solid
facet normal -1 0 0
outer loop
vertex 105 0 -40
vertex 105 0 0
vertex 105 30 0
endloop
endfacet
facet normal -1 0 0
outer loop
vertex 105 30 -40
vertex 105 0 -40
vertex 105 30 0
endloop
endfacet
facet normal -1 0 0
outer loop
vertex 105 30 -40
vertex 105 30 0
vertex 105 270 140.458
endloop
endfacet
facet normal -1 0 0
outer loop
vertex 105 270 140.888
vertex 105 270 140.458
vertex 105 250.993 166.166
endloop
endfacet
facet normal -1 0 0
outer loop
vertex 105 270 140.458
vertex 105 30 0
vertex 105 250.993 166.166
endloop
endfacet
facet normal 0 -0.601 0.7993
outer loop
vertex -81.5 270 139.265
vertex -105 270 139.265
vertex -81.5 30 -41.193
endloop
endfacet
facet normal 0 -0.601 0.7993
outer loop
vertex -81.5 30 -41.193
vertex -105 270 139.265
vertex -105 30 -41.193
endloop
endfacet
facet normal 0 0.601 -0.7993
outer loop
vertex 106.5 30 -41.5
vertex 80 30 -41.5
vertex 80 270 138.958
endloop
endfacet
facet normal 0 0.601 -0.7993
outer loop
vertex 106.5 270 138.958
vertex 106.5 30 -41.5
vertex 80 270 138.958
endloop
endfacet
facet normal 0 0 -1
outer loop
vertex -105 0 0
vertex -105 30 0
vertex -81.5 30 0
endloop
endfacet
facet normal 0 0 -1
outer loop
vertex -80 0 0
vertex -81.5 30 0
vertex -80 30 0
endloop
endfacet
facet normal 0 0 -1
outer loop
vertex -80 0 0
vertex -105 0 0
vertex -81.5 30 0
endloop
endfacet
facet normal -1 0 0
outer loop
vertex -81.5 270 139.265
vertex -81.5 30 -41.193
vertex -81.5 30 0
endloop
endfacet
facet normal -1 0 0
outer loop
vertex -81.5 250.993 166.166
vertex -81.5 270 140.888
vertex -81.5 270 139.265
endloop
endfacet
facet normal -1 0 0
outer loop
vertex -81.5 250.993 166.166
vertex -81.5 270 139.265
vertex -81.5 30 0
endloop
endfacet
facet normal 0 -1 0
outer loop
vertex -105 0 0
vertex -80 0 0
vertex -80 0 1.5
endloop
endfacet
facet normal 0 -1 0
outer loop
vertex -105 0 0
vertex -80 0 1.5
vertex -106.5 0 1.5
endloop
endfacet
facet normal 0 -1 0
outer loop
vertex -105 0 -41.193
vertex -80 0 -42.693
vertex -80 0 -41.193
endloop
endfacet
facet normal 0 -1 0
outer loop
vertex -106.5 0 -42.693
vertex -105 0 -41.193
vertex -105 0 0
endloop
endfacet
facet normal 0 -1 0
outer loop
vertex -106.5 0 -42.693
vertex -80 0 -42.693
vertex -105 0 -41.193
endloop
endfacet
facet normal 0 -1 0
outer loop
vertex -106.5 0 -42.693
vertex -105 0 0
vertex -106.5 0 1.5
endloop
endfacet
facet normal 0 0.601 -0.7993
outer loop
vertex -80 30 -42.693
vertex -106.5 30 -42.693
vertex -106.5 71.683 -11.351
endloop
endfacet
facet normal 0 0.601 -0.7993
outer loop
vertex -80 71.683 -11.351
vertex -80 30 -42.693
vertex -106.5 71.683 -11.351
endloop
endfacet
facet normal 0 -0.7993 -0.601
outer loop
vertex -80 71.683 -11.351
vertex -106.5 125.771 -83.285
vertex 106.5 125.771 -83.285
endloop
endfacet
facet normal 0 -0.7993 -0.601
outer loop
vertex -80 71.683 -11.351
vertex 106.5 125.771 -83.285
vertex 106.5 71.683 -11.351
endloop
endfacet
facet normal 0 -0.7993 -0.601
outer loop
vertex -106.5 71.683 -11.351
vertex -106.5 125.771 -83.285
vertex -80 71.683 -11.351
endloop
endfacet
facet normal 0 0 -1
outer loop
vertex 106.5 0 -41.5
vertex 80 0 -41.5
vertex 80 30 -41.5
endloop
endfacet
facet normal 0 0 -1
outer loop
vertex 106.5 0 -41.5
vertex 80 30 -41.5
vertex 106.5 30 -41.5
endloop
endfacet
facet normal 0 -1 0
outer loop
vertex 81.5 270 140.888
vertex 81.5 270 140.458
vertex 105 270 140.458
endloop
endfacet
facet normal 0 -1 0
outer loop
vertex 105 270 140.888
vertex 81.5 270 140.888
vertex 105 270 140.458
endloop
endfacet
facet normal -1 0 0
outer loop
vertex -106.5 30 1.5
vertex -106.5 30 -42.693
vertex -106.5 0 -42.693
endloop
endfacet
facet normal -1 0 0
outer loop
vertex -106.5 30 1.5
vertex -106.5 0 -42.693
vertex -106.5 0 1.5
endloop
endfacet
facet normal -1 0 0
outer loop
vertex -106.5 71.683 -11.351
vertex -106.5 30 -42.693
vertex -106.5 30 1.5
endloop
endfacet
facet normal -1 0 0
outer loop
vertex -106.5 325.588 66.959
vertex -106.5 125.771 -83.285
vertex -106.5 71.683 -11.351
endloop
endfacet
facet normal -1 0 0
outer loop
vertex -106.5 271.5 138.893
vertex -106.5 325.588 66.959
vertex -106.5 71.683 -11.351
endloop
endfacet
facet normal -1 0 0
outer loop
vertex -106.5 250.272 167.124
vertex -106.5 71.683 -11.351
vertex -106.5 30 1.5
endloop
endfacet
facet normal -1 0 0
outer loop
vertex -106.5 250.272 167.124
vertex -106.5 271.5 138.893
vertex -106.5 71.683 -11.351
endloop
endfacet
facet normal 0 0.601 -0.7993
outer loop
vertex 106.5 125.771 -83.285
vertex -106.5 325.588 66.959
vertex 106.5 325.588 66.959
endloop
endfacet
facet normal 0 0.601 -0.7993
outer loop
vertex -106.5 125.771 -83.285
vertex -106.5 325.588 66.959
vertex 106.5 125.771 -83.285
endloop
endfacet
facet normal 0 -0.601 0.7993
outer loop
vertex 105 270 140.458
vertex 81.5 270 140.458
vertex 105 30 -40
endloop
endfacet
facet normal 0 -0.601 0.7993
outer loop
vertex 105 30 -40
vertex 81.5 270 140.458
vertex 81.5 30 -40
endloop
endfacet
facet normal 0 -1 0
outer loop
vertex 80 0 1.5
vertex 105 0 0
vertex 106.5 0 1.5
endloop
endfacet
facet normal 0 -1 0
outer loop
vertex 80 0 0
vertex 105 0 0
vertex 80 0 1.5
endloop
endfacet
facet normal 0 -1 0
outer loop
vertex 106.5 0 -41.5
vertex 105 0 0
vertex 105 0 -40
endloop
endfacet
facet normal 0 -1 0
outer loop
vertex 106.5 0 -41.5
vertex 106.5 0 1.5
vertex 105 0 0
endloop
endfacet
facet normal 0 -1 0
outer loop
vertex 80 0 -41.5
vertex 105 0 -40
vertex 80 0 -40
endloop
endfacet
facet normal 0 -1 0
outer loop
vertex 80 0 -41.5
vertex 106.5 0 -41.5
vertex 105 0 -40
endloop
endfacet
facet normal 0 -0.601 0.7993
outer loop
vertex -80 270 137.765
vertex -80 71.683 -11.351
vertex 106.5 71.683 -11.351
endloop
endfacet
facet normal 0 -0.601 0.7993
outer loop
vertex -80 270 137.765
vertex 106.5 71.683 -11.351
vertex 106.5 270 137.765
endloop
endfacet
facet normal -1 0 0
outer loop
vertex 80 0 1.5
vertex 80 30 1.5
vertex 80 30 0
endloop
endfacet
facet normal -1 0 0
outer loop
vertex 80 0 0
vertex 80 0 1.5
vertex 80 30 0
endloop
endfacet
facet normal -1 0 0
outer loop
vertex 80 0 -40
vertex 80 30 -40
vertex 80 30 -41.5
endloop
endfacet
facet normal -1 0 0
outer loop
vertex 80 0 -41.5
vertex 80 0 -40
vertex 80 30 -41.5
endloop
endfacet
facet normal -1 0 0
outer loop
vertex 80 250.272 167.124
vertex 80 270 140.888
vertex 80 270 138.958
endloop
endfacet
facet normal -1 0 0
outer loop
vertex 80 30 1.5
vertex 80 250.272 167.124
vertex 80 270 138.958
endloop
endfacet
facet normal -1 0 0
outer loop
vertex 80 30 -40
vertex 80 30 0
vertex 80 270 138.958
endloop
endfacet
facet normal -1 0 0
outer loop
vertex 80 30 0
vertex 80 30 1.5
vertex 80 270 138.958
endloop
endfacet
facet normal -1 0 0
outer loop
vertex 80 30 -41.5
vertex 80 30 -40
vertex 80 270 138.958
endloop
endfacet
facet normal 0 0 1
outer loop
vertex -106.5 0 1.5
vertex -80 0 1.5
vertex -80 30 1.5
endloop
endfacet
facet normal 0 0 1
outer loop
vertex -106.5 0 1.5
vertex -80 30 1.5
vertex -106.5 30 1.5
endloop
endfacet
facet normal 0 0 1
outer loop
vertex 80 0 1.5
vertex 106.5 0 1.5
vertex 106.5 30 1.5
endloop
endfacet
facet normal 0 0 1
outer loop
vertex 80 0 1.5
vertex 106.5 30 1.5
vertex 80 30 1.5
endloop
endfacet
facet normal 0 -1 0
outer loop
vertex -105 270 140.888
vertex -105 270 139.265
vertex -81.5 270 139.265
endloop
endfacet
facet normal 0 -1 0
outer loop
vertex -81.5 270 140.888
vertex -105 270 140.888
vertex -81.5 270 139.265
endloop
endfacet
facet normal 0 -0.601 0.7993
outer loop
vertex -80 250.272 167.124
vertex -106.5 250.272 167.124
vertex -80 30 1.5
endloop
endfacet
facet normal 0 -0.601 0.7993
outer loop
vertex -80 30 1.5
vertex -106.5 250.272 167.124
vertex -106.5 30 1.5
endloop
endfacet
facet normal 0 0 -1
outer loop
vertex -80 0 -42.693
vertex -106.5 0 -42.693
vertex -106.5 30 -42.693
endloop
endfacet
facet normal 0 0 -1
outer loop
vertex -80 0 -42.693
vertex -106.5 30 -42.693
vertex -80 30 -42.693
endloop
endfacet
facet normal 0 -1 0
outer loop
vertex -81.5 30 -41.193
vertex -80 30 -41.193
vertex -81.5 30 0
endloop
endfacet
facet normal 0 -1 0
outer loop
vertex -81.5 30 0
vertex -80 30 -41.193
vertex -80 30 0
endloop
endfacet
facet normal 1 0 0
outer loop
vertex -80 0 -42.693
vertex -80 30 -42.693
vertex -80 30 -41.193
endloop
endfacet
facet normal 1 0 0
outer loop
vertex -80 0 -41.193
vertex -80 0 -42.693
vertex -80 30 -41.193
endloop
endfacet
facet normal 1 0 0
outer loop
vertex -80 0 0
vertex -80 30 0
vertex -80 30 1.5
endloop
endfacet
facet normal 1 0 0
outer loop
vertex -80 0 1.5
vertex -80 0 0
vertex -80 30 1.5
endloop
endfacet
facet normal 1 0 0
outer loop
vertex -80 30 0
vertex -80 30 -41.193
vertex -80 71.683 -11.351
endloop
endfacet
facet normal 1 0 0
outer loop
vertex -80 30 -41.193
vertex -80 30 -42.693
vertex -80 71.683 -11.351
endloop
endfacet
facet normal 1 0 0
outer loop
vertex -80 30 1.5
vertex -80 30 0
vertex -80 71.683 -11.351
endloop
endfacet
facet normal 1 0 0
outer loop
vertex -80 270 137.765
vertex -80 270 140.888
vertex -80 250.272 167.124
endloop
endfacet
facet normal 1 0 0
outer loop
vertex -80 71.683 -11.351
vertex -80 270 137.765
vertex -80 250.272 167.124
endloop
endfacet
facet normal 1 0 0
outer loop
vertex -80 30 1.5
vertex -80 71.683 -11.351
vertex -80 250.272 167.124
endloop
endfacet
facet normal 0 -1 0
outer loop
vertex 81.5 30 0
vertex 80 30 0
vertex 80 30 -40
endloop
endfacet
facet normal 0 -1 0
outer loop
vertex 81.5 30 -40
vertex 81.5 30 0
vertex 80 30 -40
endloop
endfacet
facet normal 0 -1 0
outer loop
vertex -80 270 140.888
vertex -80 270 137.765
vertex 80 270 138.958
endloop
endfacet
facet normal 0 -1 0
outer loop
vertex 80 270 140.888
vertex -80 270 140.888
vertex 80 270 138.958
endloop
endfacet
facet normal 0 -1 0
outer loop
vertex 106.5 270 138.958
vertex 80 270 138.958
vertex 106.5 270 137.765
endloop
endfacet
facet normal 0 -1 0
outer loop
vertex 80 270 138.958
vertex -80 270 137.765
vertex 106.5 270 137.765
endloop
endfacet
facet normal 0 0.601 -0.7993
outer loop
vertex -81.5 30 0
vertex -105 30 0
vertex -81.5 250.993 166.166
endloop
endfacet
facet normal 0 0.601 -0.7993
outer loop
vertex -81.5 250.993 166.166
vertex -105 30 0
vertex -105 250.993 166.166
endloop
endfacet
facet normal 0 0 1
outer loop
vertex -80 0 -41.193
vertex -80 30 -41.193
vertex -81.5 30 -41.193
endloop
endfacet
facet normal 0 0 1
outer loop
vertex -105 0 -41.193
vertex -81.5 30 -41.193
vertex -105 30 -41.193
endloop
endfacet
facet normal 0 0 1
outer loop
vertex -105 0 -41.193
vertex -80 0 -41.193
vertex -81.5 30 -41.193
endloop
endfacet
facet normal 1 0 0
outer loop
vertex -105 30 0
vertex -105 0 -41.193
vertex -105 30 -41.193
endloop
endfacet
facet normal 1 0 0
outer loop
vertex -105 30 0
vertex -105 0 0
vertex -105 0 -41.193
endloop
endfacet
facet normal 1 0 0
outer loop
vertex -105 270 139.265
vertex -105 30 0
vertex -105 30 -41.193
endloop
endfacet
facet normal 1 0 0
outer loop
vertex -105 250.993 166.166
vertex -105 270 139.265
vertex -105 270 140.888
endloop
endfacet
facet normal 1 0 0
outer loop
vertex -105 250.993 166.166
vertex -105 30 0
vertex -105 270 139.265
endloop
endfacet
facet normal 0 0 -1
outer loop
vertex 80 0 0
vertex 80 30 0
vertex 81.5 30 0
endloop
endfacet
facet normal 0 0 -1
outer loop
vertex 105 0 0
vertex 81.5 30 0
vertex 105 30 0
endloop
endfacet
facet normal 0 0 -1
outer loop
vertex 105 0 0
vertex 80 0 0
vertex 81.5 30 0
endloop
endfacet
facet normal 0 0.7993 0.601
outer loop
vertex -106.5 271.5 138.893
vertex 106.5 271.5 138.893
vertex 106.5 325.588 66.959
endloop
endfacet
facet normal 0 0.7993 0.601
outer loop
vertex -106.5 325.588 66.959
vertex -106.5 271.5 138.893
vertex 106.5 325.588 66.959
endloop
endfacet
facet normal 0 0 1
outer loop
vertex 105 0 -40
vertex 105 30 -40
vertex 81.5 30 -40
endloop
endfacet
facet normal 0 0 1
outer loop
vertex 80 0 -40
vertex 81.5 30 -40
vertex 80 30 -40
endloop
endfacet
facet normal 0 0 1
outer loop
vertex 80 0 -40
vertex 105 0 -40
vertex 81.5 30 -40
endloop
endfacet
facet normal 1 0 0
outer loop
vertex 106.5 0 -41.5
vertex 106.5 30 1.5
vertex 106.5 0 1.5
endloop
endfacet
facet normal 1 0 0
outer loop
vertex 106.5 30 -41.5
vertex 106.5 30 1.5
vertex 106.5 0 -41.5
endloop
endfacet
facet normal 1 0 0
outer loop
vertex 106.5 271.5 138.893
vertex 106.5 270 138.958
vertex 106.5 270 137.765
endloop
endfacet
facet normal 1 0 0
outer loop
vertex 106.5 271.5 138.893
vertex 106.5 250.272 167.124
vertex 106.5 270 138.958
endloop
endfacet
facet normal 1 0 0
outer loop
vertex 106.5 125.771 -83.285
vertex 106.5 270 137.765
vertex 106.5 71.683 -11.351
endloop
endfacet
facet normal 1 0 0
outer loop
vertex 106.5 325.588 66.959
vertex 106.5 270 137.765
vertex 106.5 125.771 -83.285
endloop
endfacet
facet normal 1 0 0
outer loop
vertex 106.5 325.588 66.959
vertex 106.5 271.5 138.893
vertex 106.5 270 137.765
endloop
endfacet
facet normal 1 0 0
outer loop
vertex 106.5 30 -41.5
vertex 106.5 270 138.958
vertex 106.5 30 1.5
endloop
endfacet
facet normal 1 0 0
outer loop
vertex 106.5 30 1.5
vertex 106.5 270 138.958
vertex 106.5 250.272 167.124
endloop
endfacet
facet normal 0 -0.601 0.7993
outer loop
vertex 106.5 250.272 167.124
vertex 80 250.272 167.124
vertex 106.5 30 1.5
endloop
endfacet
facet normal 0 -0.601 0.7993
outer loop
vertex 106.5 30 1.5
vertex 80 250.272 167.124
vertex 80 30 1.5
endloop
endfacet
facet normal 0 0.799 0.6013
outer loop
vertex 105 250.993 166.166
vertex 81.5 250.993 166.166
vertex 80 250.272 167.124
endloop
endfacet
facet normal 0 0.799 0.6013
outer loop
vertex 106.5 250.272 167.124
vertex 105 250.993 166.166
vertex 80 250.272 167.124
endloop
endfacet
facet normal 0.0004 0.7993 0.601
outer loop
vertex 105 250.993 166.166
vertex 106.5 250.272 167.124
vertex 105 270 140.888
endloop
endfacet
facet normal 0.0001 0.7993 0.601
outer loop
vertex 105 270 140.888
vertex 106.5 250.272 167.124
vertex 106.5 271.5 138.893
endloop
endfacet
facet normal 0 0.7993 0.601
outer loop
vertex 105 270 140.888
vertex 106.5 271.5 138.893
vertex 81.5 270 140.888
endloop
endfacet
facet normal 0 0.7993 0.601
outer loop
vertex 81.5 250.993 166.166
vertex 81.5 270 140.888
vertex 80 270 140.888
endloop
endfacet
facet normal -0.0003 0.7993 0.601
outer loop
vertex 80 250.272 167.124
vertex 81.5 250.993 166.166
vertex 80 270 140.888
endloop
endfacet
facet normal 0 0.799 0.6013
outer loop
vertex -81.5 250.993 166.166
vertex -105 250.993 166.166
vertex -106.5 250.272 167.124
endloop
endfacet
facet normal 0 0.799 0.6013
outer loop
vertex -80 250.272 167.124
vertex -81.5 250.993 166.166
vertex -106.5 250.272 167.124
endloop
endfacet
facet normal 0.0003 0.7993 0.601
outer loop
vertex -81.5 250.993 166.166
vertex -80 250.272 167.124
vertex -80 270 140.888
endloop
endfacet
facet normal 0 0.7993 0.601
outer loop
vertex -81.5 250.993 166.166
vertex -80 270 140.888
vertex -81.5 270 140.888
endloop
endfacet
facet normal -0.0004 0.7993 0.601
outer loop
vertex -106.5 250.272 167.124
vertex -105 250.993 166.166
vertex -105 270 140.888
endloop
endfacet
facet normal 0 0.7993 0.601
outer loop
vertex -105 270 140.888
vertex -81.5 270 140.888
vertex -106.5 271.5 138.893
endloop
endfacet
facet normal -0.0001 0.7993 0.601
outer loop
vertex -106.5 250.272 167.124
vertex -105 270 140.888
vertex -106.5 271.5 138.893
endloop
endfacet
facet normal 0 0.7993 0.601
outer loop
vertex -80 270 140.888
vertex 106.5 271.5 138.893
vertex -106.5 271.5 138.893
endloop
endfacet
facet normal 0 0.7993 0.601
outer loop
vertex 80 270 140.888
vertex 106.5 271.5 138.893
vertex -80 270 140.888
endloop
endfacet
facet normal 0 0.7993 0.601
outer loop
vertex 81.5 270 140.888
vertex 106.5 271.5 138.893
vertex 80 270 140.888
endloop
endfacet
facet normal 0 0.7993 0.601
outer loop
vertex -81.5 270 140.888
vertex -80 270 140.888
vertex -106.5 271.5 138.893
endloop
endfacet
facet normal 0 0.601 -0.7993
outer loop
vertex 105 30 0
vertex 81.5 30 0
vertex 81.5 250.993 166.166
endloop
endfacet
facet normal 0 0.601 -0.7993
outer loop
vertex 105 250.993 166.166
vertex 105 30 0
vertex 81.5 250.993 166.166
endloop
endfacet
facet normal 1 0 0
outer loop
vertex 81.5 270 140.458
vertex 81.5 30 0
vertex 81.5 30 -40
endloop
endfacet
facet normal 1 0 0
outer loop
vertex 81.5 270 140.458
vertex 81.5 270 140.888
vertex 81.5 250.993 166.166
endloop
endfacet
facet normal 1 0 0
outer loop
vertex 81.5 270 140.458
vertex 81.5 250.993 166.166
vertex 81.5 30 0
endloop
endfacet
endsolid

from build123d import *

# Parameters (mm, degrees)
BOSS_EXTRUDE1_DEPTH   = 30
BOSS_EXTRUDE1_2_DEPTH = 30
SWEEP1_START          = -106.5
SWEEP1_DEPTH          = 26.5
SWEEP1_2_DEPTH        = 1.5
SWEEP2_START          = 80
SWEEP2_DEPTH          = 26.5
SWEEP2_START_2        = 105
SWEEP2_2_DEPTH        = 1.5
BOSS_EXTRUDE2_DEPTH   = 1.5
BOSS_EXTRUDE3_DEPTH   = 1.5
SKETCH7_W             = 213
SKETCH7_H             = 44.192821834
BOSS_EXTRUDE4_DEPTH   = 1.5
BOSS_EXTRUDE5_REACH   = 392.115
SKETCH9_W             = 222.593563538
SKETCH9_H             = 76.90916357
CUT_EXTRUDE1_DEPTH    = 487.5


# Read off the part's stored shape, not the designer's step: Sweep1, Sweep2
with BuildPart() as part:
    # Sketch1 → Boss-Extrude1 (new body)
    with BuildSketch(Plane(origin=(0, 0, 0), x_dir=(1, 0, 0), z_dir=(0, 1, 0))):
        Polygon((-80, 0), (-80, -1.5), (-106.5, -1.5), (-106.5, 42.692821834), (-80, 42.692821834), (-80, 41.192821834), (-105, 41.192821834), (-105, 0), align=None)
    extrude(amount=BOSS_EXTRUDE1_DEPTH)

    # Sweep1 outline → Sweep1 (add)
    with BuildSketch(Plane.YZ.offset(SWEEP1_START)):
        Polygon((30, -42.692821834), (270, 137.764932896), (270, 139.264932896), (30, -41.192821834), align=None)
        Polygon((30, 0), (270, 180.45775473), (270, 181.95775473), (30, 1.5), align=None)
    extrude(amount=SWEEP1_DEPTH)

    # Sweep1 2 outline → Sweep1 2 (add)
    with BuildSketch(Plane.YZ.offset(SWEEP1_START)):
        Polygon((30, -41.192821834), (270, 139.264932896), (270, 180.45775473), (30, 0), align=None)
    extrude(amount=SWEEP1_2_DEPTH)

    # Sketch5 → Boss-Extrude2 (add)
    with BuildSketch(Plane(origin=(-80, 0, 0), x_dir=(0, 0, -1), z_dir=(1, 0, 0))):
        Polygon((0, 30), (-180.45775473, 270), (-139.264932896, 270), (41.192821834, 30), align=None)
    extrude(amount=-BOSS_EXTRUDE2_DEPTH)



with BuildPart() as body_2:
    # Sketch1 → Boss-Extrude1 2 (new body)
    with BuildSketch(Plane(origin=(0, 0, 0), x_dir=(1, 0, 0), z_dir=(0, 1, 0))):
        Polygon((80, 0), (105, 0), (105, 40), (80, 40), (80, 41.5), (106.5, 41.5), (106.5, -1.5), (80, -1.5), align=None)
    extrude(amount=BOSS_EXTRUDE1_2_DEPTH)

    # Sweep2 outline → Sweep2 (add)
    with BuildSketch(Plane.YZ.offset(SWEEP2_START)):
        Polygon((270, 180.45775473), (270, 181.95775473), (30, 1.5), (30, 0), align=None)
        Polygon((270, 138.95775473), (270, 140.45775473), (30, -40), (30, -41.5), align=None)
    extrude(amount=SWEEP2_DEPTH)

    # Sweep2 2 outline → Sweep2 2 (add)
    with BuildSketch(Plane.YZ.offset(SWEEP2_START_2)):
        Polygon((270, 140.45775473), (270, 180.45775473), (30, 0), (30, -40), align=None)
    extrude(amount=SWEEP2_2_DEPTH)

    # Sketch6 → Boss-Extrude3 (add)
    with BuildSketch(Plane.ZY.offset(-80)):
        Polygon((-40, 30), (140.45775473, 270), (180.45775473, 270), (0, 30), align=None)
    extrude(amount=-BOSS_EXTRUDE3_DEPTH)


with BuildPart() as part_1:
    add(part.part)

    add(body_2.part)  # Boss-Extrude4 merges body 2
    # Sketch7 → Boss-Extrude4 (add)
    with BuildSketch(Plane(origin=(0, 270, 0), x_dir=(1, 0, 0), z_dir=(0, 1, 0))):
        with Locations((0, -159.861343813)):
            Rectangle(SKETCH7_W, SKETCH7_H)
    extrude(amount=BOSS_EXTRUDE4_DEPTH)

    # Boss-Extrude5: up to this face of the body (flat: up to its plane)
    boss_extrude5_end = Plane(part_1.part.faces().sort_by_distance((106.5, 135.770686917, 60.769229512))[0])
    # Sketch8 → Boss-Extrude5 (add, up to the picked face)
    with BuildSketch(Plane.ZY.offset(106.5), mode=Mode.PRIVATE) as boss_extrude5_sk1:
        Polygon((-11.351006958, 71.683083011), (137.764932896, 270), (137.764932896, 271.5), (138.892793863, 271.5), (66.958703747, 325.587768295), (-83.285097074, 125.770851306), align=None)
    boss_extrude5_tool1 = split(extrude(boss_extrude5_sk1.sketch, amount=-BOSS_EXTRUDE5_REACH, mode=Mode.PRIVATE), bisect_by=boss_extrude5_end, keep=Keep.BOTH, mode=Mode.PRIVATE)
    add(boss_extrude5_tool1.solids().sort_by(Axis((-106.5, 198.632705, 27.7997), (1, 0, 0)))[0])

    # Sketch9 → Cut-Extrude1 (cut)
    with BuildSketch(Plane(origin=(0, 85.429976286, -113.617695949), x_dir=(-1, 0, 0), z_dir=(0, 0.6009752032818666, -0.7992676679563107))):
        with Locations((4.796781769, 338.926878661)):
            Rectangle(SKETCH9_W, SKETCH9_H)
    extrude(amount=-CUT_EXTRUDE1_DEPTH, mode=Mode.SUBTRACT)


solid = part_1.part
